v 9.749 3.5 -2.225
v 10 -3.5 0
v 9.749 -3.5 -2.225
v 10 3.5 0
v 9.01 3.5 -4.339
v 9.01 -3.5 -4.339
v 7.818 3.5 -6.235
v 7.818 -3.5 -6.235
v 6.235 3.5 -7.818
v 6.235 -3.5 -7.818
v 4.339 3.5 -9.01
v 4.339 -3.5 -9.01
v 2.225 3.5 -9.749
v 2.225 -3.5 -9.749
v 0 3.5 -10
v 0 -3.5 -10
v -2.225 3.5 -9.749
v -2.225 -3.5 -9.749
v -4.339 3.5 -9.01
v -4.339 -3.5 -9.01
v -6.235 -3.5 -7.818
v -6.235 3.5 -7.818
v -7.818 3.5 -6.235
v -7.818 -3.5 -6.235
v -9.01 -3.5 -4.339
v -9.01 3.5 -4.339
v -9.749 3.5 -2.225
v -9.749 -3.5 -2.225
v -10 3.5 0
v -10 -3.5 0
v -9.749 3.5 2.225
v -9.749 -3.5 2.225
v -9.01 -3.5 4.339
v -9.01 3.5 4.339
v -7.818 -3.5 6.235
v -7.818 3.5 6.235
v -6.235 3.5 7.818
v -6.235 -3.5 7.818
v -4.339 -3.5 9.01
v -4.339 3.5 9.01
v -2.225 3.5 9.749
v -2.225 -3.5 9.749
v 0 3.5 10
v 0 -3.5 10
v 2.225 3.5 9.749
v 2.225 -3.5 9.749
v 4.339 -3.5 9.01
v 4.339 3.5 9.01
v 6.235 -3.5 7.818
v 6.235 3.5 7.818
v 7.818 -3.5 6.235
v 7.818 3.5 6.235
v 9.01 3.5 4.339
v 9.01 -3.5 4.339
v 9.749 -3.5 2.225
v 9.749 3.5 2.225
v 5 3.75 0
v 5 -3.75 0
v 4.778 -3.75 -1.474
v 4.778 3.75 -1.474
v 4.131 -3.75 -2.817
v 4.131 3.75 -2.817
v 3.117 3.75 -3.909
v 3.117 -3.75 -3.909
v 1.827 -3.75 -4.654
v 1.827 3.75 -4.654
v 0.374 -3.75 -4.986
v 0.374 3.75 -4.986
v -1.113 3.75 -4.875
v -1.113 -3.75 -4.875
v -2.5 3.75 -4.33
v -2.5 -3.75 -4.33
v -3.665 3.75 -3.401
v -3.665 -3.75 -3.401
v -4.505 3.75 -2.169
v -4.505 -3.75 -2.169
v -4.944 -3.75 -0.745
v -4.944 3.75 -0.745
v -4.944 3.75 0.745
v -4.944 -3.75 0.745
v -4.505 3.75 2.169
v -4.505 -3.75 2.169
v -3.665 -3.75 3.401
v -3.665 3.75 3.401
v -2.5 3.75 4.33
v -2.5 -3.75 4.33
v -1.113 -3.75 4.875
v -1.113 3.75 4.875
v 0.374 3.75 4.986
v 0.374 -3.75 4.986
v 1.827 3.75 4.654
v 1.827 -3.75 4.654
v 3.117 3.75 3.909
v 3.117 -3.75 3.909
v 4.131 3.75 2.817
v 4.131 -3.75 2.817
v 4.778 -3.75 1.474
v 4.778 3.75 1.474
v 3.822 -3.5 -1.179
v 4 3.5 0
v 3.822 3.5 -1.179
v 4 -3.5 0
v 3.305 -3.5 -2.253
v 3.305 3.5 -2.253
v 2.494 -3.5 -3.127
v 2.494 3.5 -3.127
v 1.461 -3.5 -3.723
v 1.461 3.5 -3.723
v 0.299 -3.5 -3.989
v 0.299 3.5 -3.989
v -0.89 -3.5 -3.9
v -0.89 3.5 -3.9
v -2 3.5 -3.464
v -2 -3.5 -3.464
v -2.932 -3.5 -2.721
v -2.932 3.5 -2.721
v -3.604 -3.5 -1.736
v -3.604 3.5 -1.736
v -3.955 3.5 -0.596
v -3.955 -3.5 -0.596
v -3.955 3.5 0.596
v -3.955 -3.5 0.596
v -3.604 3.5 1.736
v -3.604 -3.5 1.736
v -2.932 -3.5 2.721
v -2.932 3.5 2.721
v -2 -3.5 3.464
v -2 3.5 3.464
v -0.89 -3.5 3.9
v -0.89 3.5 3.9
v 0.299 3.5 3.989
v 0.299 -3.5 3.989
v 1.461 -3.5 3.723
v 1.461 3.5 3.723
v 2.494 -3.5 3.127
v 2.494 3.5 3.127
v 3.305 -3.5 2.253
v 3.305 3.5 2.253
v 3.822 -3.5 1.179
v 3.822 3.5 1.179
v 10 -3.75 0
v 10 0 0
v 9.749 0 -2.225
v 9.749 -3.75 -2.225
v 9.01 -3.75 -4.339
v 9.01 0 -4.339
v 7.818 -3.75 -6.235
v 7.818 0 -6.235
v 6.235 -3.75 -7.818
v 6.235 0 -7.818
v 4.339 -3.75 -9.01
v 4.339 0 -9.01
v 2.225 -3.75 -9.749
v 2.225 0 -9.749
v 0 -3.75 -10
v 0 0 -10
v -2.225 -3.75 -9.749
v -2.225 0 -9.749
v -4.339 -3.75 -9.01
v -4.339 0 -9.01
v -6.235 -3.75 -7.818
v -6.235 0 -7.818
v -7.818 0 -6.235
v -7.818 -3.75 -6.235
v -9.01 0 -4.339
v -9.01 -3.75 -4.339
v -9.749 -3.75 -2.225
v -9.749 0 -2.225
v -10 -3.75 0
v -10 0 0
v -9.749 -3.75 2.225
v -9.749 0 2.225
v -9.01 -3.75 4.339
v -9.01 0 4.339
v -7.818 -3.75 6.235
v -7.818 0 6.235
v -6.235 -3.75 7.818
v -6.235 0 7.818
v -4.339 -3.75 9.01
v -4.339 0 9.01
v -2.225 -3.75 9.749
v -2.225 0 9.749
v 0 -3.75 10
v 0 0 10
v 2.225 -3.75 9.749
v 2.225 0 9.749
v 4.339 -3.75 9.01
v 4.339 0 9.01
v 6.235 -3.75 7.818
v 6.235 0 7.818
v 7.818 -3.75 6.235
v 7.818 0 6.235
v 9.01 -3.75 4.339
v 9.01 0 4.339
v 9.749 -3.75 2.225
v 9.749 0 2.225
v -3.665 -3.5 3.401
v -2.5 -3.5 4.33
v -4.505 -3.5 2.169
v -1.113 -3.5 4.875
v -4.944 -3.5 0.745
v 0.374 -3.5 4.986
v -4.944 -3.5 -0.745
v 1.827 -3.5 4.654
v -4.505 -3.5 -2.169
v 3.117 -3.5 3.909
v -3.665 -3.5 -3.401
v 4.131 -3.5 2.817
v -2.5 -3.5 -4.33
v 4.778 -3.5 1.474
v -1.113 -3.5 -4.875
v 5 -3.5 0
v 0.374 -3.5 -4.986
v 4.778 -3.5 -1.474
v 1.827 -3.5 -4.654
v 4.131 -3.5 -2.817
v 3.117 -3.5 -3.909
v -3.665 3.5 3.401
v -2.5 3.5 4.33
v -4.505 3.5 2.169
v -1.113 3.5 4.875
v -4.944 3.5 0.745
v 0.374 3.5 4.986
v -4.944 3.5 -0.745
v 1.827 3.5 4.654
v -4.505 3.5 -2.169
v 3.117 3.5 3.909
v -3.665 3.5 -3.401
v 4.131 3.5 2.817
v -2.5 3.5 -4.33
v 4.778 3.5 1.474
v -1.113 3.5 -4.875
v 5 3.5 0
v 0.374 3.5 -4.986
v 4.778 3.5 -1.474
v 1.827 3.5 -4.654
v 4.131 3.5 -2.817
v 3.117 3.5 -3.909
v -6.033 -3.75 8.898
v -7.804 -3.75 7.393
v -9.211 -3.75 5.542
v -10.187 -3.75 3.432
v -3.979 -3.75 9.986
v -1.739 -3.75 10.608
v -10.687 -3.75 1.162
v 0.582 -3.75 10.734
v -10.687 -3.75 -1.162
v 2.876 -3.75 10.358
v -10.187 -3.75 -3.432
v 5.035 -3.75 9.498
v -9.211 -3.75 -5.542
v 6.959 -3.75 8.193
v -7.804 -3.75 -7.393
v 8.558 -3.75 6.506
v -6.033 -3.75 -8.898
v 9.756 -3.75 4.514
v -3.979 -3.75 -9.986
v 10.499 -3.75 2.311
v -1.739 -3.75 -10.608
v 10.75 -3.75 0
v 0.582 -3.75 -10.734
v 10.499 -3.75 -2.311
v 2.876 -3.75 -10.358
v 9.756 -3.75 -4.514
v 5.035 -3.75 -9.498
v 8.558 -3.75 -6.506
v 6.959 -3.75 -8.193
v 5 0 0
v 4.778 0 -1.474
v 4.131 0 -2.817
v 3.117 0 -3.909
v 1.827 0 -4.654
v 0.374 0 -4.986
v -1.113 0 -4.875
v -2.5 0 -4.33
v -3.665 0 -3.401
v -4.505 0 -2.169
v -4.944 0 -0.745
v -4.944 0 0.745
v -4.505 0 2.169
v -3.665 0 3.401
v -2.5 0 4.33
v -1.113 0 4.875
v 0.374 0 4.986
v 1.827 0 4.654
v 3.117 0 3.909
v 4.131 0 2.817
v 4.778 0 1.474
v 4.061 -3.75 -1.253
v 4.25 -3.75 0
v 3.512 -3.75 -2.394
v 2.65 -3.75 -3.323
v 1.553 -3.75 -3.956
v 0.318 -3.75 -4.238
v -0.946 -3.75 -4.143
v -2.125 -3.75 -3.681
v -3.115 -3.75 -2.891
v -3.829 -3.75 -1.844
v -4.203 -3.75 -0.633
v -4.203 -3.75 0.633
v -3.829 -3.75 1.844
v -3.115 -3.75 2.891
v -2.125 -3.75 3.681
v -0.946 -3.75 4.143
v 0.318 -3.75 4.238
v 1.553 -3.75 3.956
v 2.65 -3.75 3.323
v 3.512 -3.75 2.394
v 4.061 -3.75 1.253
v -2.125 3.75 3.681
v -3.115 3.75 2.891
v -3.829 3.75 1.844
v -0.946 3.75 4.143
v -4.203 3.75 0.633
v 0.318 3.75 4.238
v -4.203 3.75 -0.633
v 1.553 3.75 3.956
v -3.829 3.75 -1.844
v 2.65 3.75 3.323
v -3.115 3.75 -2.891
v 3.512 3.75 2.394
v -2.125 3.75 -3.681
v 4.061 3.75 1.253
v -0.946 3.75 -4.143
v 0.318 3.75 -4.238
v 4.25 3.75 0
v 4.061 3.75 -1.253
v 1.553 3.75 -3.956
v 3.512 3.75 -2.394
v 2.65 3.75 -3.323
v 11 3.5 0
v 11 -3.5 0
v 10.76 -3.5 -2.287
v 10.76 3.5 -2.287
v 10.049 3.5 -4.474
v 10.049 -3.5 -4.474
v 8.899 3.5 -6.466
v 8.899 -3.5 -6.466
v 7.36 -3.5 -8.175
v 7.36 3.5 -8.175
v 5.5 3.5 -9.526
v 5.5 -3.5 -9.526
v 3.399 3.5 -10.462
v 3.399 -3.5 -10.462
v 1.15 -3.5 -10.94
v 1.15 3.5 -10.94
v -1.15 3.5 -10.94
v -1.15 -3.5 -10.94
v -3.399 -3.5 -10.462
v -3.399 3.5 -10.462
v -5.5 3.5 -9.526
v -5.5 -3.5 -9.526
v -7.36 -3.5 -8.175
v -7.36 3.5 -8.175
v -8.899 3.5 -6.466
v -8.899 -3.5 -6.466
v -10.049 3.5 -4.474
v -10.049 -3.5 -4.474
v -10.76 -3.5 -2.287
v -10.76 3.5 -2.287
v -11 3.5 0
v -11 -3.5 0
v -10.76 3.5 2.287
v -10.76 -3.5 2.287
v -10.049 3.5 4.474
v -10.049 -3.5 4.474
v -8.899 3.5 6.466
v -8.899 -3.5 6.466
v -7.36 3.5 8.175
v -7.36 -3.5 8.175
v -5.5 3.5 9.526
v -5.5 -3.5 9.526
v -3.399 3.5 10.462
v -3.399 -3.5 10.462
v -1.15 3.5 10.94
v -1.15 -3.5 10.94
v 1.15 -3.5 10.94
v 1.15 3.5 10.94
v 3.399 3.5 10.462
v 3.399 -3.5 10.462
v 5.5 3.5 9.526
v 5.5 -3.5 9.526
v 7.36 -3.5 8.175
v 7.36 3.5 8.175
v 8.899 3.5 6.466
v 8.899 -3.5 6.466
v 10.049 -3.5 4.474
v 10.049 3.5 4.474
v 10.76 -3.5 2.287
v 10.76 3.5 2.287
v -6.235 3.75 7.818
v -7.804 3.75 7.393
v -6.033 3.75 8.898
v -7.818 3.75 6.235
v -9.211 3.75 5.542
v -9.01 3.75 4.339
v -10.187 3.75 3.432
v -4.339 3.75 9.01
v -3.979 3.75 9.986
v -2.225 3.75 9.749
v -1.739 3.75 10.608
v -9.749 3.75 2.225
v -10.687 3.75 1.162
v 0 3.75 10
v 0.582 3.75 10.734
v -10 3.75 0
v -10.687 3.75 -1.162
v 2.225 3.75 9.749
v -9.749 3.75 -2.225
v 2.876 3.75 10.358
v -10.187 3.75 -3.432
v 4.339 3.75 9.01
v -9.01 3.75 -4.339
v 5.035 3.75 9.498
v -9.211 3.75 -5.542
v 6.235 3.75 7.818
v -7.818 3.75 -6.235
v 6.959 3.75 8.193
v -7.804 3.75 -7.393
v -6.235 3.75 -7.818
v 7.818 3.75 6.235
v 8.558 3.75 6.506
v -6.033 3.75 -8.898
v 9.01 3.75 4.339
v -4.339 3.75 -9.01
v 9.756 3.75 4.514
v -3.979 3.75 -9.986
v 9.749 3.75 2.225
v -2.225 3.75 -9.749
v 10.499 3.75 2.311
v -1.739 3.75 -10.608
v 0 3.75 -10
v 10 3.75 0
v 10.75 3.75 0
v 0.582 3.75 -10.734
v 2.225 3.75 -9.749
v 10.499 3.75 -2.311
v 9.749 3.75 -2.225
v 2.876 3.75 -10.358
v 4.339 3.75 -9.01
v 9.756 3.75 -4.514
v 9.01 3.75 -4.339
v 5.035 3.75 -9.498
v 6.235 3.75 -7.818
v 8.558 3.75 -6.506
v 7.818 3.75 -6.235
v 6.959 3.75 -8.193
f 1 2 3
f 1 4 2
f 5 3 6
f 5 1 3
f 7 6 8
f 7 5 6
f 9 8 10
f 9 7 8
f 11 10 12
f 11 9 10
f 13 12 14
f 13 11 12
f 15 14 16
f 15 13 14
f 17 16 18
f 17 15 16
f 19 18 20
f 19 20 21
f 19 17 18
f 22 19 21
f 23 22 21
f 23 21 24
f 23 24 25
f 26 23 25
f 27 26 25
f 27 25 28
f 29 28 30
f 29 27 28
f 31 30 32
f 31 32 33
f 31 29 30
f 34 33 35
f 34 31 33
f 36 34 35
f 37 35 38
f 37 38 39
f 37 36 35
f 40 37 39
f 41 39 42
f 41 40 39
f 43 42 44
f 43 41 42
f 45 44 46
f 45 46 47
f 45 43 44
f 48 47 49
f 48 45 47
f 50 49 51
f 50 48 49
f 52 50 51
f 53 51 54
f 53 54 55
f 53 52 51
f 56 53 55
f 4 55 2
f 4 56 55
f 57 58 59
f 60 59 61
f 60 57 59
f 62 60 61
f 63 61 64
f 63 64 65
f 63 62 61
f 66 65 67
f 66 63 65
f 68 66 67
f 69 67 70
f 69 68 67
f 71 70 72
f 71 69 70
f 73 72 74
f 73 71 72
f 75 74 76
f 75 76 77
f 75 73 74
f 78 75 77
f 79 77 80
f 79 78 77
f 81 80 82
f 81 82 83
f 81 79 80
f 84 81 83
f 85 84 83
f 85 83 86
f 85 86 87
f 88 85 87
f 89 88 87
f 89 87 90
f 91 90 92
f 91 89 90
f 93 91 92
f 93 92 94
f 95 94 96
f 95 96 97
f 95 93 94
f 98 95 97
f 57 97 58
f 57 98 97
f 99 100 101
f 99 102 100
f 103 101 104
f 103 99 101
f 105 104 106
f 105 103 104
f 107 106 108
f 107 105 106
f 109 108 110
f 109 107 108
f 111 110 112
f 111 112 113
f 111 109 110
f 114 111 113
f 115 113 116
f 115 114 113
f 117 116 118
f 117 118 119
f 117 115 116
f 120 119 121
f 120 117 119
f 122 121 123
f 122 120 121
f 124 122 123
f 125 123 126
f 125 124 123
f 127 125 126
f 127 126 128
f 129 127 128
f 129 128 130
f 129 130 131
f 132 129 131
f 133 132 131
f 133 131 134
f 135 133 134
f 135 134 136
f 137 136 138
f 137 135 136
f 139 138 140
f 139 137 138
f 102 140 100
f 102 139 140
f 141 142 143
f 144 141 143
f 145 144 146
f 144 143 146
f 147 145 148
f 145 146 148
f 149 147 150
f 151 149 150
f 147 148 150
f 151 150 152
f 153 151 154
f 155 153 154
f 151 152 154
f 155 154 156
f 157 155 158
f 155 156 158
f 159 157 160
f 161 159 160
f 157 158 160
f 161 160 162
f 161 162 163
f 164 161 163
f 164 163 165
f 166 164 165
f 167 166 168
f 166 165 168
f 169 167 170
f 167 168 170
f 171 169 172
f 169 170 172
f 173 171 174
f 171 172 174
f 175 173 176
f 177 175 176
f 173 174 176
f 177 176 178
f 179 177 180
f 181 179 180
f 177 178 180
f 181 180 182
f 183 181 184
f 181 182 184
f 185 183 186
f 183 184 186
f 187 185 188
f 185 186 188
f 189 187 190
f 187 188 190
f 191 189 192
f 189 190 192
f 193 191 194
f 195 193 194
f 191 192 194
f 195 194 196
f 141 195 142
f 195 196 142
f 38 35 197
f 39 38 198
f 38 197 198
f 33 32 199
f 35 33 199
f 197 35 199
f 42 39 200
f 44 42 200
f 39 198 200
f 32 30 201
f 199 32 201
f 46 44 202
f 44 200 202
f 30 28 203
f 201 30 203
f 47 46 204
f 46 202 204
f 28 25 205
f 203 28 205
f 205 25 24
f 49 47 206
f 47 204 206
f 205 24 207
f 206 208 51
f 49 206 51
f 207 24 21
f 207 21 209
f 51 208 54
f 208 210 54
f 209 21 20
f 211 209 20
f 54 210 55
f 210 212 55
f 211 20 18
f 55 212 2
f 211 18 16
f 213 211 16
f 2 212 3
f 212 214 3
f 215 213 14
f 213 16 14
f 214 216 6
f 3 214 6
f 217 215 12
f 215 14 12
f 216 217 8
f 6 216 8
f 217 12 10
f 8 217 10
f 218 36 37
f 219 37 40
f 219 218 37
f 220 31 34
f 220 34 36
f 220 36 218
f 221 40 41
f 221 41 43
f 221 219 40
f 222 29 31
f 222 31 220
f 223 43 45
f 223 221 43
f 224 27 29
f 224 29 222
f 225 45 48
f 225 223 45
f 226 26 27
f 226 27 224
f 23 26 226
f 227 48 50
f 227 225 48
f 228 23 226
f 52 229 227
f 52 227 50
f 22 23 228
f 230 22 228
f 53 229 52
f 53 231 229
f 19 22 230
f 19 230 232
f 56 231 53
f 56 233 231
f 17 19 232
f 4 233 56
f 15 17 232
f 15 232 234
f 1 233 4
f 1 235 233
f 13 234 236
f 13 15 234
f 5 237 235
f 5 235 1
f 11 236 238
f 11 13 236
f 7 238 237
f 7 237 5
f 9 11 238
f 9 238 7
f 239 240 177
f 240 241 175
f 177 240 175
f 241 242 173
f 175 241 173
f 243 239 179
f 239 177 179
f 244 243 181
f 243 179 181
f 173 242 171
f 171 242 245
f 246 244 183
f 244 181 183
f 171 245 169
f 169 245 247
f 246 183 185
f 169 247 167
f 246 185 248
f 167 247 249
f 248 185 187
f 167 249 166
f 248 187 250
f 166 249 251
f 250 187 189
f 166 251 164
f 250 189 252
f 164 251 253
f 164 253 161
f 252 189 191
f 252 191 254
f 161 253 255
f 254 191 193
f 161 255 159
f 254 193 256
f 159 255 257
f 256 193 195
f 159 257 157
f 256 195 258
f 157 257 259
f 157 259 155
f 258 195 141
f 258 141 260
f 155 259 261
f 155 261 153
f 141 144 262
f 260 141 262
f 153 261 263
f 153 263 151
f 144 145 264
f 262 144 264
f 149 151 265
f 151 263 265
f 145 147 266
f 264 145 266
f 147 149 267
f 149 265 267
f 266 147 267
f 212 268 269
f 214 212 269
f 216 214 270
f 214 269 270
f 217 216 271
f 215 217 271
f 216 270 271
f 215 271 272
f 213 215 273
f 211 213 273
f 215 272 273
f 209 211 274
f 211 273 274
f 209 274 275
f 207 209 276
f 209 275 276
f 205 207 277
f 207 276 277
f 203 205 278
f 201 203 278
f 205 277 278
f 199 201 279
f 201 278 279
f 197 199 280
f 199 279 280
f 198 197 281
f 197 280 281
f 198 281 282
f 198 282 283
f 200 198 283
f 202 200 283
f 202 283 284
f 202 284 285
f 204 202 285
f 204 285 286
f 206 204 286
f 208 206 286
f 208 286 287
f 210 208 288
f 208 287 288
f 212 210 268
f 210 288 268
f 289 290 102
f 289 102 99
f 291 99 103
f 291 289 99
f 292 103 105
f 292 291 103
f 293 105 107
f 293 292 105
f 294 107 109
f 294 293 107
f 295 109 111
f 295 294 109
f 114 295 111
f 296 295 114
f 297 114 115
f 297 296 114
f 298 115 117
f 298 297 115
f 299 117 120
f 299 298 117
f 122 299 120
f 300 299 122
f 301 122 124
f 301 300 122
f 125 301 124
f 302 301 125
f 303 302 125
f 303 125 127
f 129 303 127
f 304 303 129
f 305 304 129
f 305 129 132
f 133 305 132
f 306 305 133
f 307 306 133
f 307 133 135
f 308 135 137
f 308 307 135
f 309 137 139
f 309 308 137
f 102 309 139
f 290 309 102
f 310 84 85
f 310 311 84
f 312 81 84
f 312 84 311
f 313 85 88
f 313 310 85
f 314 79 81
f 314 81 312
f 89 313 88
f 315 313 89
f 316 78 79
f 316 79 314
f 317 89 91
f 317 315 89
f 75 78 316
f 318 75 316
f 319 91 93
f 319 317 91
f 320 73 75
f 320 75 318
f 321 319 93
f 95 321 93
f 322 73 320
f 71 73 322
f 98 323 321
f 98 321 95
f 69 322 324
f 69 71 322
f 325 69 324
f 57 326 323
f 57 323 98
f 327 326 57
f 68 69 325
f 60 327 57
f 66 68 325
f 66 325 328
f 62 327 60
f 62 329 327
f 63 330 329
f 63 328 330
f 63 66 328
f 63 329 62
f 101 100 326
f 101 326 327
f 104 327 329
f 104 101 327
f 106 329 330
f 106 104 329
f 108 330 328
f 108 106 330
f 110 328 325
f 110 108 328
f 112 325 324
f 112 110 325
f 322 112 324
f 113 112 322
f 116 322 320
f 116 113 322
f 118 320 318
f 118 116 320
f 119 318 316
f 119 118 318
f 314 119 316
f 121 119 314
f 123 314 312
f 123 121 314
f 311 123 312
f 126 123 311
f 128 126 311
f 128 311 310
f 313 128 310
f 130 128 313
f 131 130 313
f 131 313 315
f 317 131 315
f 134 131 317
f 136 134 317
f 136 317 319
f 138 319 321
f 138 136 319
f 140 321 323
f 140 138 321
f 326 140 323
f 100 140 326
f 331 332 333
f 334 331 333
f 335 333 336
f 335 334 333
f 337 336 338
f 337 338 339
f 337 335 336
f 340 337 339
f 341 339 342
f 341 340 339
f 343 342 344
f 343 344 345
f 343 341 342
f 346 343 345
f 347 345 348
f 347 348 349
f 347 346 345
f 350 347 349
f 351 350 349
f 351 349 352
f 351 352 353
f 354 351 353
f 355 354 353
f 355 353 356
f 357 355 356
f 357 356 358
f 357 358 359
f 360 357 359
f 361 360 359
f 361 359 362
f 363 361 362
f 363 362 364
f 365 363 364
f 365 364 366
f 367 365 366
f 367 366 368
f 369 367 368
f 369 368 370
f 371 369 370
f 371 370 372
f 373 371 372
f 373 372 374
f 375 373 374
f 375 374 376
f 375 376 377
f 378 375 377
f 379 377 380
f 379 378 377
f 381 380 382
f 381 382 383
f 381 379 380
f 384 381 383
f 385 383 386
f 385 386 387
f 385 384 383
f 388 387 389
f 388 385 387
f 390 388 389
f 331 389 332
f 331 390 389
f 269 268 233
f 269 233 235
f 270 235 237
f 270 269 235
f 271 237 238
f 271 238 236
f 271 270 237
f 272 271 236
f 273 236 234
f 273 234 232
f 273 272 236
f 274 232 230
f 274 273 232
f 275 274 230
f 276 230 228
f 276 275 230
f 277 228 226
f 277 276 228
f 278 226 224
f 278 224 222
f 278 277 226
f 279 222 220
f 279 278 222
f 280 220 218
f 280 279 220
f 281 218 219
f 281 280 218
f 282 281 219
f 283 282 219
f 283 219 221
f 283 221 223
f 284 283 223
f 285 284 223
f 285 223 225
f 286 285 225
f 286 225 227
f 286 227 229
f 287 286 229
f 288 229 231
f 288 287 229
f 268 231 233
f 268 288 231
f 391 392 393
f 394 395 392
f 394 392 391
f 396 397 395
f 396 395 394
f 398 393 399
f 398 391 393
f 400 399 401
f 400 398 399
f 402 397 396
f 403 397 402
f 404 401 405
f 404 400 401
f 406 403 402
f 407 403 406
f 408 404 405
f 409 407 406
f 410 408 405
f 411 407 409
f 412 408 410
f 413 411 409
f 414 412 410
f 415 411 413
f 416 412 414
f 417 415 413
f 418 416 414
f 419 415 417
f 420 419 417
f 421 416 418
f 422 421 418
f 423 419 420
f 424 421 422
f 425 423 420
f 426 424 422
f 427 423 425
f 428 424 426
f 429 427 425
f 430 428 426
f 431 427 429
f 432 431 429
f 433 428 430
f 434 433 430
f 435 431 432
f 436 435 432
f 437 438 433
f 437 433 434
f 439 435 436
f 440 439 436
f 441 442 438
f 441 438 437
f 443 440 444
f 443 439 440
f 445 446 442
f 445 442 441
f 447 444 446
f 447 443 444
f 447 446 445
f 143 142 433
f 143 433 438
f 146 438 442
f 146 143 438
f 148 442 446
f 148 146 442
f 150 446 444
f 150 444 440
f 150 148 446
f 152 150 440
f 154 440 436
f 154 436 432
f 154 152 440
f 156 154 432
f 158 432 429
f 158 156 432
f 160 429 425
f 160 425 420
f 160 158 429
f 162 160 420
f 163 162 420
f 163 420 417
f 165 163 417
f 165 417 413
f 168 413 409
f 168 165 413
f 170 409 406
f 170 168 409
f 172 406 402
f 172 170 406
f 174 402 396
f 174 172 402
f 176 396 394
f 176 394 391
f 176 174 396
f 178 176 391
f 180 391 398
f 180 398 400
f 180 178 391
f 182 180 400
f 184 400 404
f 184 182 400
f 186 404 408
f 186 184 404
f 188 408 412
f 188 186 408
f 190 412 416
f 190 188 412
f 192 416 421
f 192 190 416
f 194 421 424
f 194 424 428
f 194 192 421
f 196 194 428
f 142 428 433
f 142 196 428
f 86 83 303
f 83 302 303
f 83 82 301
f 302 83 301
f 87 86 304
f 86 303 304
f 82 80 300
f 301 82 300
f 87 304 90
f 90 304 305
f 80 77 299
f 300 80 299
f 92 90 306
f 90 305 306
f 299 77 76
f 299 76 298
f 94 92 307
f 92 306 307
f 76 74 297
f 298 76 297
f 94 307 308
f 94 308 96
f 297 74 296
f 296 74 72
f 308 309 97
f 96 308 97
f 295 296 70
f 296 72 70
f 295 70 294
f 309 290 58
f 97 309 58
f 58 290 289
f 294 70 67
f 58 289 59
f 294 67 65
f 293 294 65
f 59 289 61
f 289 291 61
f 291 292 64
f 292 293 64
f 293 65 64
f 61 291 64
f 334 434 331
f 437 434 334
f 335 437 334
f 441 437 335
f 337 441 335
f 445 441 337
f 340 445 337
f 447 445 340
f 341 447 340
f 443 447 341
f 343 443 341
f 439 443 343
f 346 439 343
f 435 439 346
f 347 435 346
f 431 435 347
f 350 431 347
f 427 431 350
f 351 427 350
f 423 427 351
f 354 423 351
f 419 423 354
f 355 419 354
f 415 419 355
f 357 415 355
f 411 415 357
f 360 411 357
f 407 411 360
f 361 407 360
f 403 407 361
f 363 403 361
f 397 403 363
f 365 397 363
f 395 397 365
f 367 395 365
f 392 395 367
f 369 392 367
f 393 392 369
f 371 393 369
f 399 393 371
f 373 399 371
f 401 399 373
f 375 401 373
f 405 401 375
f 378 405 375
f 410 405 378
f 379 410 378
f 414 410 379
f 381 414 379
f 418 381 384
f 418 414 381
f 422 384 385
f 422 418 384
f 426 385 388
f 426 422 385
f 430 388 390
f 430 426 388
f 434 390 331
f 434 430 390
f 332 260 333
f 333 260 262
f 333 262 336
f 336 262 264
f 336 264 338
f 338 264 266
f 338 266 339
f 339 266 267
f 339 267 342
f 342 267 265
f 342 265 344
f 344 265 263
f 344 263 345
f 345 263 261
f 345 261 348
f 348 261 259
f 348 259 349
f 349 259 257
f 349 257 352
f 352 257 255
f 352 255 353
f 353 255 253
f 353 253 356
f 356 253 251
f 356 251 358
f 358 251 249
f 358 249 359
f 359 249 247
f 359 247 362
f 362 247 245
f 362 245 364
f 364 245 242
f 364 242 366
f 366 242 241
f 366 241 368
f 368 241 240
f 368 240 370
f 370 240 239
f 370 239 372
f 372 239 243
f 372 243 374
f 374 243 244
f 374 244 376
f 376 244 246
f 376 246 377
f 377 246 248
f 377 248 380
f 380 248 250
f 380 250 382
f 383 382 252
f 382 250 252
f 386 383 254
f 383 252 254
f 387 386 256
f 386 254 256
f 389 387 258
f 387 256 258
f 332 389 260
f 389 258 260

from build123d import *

# Parameters (mm, degrees)
EXTRUDE1_DEPTH        = 3.75
EXTRUDE1_DEPTH_BACK   = 3.75
SKETCH1_R             = 5
SKETCH1_R_2           = 4
EXTRUDE1_2_DEPTH      = 3.75
EXTRUDE1_2_DEPTH_BACK = 3.75
SKETCH1_R_3           = 11
SKETCH1_R_4           = 10
EXTRUDE2_DEPTH        = 3.5
EXTRUDE2_DEPTH_BACK   = 3.5
SKETCH1_4_R           = 10
SKETCH1_4_R_2         = 5
CHAMFER1_SIZE         = 0.25
CHAMFER2_SIZE         = 0.25
CHAMFER3_SIZE         = 0.25


with BuildPart() as part:
    # Sketch1 → Extrude1 (new, two sides: drawn at the far end of the back side and taken through both)
    with BuildSketch(Plane(origin=(0, 0, 0), x_dir=(1, 0, 0), z_dir=(0, 1, 0)).offset(-EXTRUDE1_DEPTH_BACK)):
        Circle(SKETCH1_R)
        Circle(SKETCH1_R_2, mode=Mode.SUBTRACT)
    extrude(amount=EXTRUDE1_DEPTH + EXTRUDE1_DEPTH_BACK)

    # Chamfer3
    chamfer3_edges = [part.edges().sort_by_distance(p)[0] for p in [
        (-4, 3.75, 0),
        (-4, -3.75, 0),
    ]]
    chamfer(chamfer3_edges, length=CHAMFER3_SIZE)


with BuildPart() as body_2:
    # Sketch1 → Extrude1 2 (new, two sides: drawn at the far end of the back side and taken through both)
    with BuildSketch(Plane(origin=(0, 0, 0), x_dir=(1, 0, 0), z_dir=(0, 1, 0)).offset(-EXTRUDE1_2_DEPTH_BACK)):
        Circle(SKETCH1_R_3)
        Circle(SKETCH1_R_4, mode=Mode.SUBTRACT)
    extrude(amount=EXTRUDE1_2_DEPTH + EXTRUDE1_2_DEPTH_BACK)

    # Chamfer1
    chamfer1_edges = [body_2.edges().sort_by_distance(p)[0] for p in [
        (-11, 3.75, 0),
    ]]
    chamfer(chamfer1_edges, length=CHAMFER1_SIZE)

    # Chamfer2
    chamfer2_edges = [body_2.edges().sort_by_distance(p)[0] for p in [
        (-11, -3.75, 0),
    ]]
    chamfer(chamfer2_edges, length=CHAMFER2_SIZE)


with BuildPart() as body_3:
    # Sketch1<4> → Extrude2 (new, two sides: drawn at the far end of the back side and taken through both)
    with BuildSketch(Plane(origin=(0, 0, 0), x_dir=(1, 0, 0), z_dir=(0, 1, 0)).offset(-EXTRUDE2_DEPTH_BACK)):
        Circle(SKETCH1_4_R)
        Circle(SKETCH1_4_R_2, mode=Mode.SUBTRACT)
    extrude(amount=EXTRUDE2_DEPTH + EXTRUDE2_DEPTH_BACK)


solid = Compound([part.part, body_2.part, body_3.part])
